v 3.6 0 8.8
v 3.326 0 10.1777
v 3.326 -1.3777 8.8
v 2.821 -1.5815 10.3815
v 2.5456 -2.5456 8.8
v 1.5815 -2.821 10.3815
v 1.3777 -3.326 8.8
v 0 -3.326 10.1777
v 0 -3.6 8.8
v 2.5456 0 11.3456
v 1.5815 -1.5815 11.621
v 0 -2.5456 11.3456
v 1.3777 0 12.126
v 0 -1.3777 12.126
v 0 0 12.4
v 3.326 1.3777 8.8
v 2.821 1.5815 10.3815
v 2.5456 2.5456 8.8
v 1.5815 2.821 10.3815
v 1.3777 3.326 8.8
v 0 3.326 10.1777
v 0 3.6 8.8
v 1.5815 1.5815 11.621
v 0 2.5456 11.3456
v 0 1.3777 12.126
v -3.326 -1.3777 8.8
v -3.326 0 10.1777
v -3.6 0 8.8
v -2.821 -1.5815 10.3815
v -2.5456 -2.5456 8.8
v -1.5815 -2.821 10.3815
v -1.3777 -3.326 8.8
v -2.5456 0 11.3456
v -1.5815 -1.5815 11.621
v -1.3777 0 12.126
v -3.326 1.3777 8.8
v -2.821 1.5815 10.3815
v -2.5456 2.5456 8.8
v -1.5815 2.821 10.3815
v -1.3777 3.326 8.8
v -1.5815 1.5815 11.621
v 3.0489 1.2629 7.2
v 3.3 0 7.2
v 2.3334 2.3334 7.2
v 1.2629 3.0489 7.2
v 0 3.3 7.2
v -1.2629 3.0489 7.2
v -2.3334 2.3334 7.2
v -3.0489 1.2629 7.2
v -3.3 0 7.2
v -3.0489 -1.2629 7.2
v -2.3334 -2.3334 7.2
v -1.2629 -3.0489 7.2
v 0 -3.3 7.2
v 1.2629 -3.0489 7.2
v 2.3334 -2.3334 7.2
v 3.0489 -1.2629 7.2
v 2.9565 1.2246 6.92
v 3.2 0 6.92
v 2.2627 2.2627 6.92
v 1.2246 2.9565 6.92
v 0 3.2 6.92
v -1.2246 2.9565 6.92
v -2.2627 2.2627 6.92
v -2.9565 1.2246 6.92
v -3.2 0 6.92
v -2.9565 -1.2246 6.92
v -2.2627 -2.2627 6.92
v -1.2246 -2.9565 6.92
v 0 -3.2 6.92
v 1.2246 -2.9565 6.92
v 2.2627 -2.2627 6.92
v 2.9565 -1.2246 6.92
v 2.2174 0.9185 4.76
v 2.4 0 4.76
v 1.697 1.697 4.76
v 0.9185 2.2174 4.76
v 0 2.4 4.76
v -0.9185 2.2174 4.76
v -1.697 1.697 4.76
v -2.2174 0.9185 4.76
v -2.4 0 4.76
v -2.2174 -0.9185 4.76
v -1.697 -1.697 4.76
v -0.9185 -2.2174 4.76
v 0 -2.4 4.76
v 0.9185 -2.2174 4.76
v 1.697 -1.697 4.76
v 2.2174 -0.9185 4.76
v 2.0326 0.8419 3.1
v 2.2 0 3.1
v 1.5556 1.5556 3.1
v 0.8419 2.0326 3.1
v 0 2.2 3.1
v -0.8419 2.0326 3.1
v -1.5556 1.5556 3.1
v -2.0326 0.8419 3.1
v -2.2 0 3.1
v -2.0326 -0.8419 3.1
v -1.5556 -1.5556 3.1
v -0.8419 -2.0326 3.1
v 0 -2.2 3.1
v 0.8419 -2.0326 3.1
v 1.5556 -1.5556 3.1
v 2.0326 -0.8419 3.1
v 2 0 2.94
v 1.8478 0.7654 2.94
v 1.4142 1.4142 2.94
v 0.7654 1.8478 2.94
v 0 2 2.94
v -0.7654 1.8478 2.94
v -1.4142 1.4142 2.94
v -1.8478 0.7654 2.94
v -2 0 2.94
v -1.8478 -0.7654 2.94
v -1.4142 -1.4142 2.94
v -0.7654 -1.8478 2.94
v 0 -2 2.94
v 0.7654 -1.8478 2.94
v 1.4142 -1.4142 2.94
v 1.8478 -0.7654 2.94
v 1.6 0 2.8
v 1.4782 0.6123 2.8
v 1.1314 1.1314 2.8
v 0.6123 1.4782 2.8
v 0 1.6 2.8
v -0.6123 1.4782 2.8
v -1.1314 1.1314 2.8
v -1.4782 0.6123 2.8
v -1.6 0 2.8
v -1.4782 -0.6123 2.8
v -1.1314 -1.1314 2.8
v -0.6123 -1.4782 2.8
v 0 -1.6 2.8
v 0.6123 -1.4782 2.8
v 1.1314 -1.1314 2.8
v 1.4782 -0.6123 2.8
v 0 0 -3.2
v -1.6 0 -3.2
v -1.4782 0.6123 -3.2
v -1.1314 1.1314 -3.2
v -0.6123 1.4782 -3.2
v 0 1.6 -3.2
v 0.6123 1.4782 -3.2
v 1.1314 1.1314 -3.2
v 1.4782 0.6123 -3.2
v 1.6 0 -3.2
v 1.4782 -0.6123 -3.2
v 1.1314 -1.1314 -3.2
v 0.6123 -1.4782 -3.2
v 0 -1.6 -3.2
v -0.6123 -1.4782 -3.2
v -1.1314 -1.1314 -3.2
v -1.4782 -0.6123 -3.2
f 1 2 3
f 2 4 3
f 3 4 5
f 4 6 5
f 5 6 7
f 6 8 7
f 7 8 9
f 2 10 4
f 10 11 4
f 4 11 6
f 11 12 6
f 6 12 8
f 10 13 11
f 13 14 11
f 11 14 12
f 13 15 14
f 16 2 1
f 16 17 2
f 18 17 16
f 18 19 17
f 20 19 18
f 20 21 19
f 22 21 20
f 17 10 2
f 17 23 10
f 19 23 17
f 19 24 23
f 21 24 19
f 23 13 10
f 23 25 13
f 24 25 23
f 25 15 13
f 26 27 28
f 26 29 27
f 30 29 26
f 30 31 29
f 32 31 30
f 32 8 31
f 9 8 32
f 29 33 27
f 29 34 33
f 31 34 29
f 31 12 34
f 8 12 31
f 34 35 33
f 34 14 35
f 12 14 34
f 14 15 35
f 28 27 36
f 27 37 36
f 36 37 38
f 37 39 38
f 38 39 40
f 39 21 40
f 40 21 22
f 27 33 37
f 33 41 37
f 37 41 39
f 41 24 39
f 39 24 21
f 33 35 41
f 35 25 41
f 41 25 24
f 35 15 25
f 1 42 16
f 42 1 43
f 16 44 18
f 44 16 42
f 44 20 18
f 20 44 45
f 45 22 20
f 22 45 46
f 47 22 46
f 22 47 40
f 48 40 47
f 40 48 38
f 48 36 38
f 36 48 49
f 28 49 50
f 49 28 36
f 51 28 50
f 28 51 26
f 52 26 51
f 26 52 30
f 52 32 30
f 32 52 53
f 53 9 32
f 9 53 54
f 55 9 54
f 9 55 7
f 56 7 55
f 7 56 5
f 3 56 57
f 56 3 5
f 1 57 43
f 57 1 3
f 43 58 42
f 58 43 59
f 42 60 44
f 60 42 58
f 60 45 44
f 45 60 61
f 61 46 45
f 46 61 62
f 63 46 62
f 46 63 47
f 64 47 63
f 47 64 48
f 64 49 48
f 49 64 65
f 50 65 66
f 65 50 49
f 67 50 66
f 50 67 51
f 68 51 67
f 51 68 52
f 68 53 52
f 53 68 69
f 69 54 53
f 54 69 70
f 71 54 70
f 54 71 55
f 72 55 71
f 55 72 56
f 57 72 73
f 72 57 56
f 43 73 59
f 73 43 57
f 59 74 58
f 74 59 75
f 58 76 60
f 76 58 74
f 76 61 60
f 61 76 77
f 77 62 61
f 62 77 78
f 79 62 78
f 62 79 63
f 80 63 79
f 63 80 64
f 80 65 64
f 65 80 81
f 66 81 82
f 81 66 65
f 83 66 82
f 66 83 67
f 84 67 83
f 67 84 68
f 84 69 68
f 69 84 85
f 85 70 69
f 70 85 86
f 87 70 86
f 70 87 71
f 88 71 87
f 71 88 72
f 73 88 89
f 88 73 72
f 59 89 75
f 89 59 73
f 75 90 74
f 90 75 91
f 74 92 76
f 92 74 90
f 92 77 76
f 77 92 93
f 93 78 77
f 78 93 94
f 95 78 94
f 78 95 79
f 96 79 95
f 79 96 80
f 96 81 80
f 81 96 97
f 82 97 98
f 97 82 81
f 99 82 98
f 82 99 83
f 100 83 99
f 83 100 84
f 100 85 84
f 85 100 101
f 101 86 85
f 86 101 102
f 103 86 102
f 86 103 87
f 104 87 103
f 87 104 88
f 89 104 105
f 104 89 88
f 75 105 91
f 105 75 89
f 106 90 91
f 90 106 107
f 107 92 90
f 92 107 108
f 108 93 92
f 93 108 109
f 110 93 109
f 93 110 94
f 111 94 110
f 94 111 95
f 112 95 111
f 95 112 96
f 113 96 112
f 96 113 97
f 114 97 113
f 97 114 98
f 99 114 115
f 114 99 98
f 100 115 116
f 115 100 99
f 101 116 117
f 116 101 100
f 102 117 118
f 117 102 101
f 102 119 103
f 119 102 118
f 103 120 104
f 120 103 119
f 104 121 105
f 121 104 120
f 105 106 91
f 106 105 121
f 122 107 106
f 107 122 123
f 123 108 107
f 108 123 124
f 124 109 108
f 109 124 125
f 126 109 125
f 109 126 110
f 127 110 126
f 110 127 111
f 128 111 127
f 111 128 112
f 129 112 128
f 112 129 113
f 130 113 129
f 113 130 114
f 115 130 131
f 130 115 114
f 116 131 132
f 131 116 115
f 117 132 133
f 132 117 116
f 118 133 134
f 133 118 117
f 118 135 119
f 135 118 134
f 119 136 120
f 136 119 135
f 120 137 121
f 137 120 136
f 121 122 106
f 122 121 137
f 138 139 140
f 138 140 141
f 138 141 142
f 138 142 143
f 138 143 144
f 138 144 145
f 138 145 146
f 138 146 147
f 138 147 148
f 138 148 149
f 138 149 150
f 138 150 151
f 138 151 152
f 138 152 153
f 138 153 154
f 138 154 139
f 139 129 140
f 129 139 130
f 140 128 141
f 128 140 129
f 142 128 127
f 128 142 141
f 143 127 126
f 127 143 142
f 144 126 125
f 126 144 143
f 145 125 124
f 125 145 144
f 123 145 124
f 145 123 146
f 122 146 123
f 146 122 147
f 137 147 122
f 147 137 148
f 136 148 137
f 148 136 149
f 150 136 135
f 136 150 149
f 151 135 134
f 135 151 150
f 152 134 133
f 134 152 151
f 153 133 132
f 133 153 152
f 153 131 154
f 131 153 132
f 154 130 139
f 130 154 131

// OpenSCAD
use <../lib.scad>
use <../p/4-4con10.scad>
use <../p/4-4con11.scad>
use <../p/4-4con3.scad>
use <../p/4-4con32.scad>
use <../p/4-4con4.scad>
use <../p/4-4cylc.scad>
use <../p/4-4edge.scad>
use <../p/4-8sphe.scad>
$fa=1; $fs=0.2;
function ldraw_lib__90508(realsolid=false) = [
// 0 Minifig Maracas
// 0 Name: 90508.dat
// 0 Author: Magnus Forsberg [MagFors]
// 0 !LDRAW_ORG Part UPDATE 2011-01
// 0 !LICENSE Licensed under CC BY 2.0 and CC BY 4.0 : see CAreadme.txt
// 
// 0 BFC CERTIFY CCW
  [0,"BFC","CERTIFY"],
  [0,"BFC","CCW"],
// 
// 0 !CATEGORY Minifig Accessory
// 
// 0 !HISTORY 2011-07-25 [PTadmin] Official Update 2011-01
// 
// 
// 1 16 0 -22 0 9 0 0 0 -9 0 0 0 -9 4-8sphe.dat
  [1,16,0,-22,0,9,0,0,0,-9,0,0,0,-9, ldraw_lib__4_8sphe(realsolid)],
// 1 16 0 -22 0 0.75 0 0 0 4 0 0 0 0.75 4-4con11.dat
  [1,16,0,-22,0,0.75,0,0,0,4,0,0,0,0.75, ldraw_lib__4_4con11(realsolid)],
// 1 16 0 -18 0 0.25 0 0 0 0.7 0 0 0 0.25 4-4con32.dat
  [1,16,0,-18,0,0.25,0,0,0,0.7,0,0,0,0.25, ldraw_lib__4_4con32(realsolid)],
// 1 16 0 -17.3 0 2 0 0 0 5.4 0 0 0 2 4-4con3.dat
  [1,16,0,-17.3,0,2,0,0,0,5.4,0,0,0,2, ldraw_lib__4_4con3(realsolid)],
// 1 16 0 -11.9 0 0.5 0 0 0 4.15 0 0 0 0.5 4-4con11.dat
  [1,16,0,-11.9,0,0.5,0,0,0,4.15,0,0,0,0.5, ldraw_lib__4_4con11(realsolid)],
// 1 16 0 -7.75 0 5.5 0 0 0 1 0 0 0 5.5 4-4edge.dat
  [1,16,0,-7.75,0,5.5,0,0,0,1,0,0,0,5.5, ldraw_lib__4_4edge(realsolid)],
// 1 16 0 -7.75 0 0.5 0 0 0 0.4 0 0 0 0.5 4-4con10.dat
  [1,16,0,-7.75,0,0.5,0,0,0,0.4,0,0,0,0.5, ldraw_lib__4_4con10(realsolid)],
// 1 16 0 -7.35 0 1 0 0 0 0.35 0 0 0 1 4-4con4.dat
  [1,16,0,-7.35,0,1,0,0,0,0.35,0,0,0,1, ldraw_lib__4_4con4(realsolid)],
// 1 16 0 8 0 -4 0 0 0 -15 0 0 0 4 4-4cylc.dat
  [1,16,0,8,0,-4,0,0,0,-15,0,0,0,4, ldraw_lib__4_4cylc(realsolid)],
// 0 // Added lines/Condlines
// 5 24 9 -22 0 8.3151 -22 3.4443 8.25 -18 0 8.3151 -25.4443 0
  [5,24,9,-22,0,8.3151,-22,3.4443,8.25,-18,0,8.3151,-25.4443,0],
// 5 24 7.62218 -18 3.15727 8.25 -18 0 9 -22 0 8 -17.3 0
  [5,24,7.62218,-18,3.15727,8.25,-18,0,9,-22,0,8,-17.3,0],
// 5 24 8.3151 -22 3.4443 6.3639 -22 6.3639 7.62218 -18 3.15727 5.8797 -25.4443 5.8797
  [5,24,8.3151,-22,3.4443,6.3639,-22,6.3639,7.62218,-18,3.15727,5.8797,-25.4443,5.8797],
// 5 24 5.83357 -18 5.83357 7.62218 -18 3.15727 8.3151 -22 3.4443 7.3912 -17.3 3.0616
  [5,24,5.83357,-18,5.83357,7.62218,-18,3.15727,8.3151,-22,3.4443,7.3912,-17.3,3.0616],
// 5 24 6.3639 -22 6.3639 3.4443 -22 8.3151 5.83357 -18 5.83357 3.4443 -25.4443 7.5681
  [5,24,6.3639,-22,6.3639,3.4443,-22,8.3151,5.83357,-18,5.83357,3.4443,-25.4443,7.5681],
// 5 24 3.15727 -18 7.62218 5.83357 -18 5.83357 6.3639 -22 6.3639 5.6568 -17.3 5.6568
  [5,24,3.15727,-18,7.62218,5.83357,-18,5.83357,6.3639,-22,6.3639,5.6568,-17.3,5.6568],
// 5 24 3.4443 -22 8.3151 0 -22 9 3.15727 -18 7.62218 3.4443 -25.4443 7.5681
  [5,24,3.4443,-22,8.3151,0,-22,9,3.15727,-18,7.62218,3.4443,-25.4443,7.5681],
// 5 24 0 -18 8.25 3.15727 -18 7.62218 3.4443 -22 8.3151 3.0616 -17.3 7.3912
  [5,24,0,-18,8.25,3.15727,-18,7.62218,3.4443,-22,8.3151,3.0616,-17.3,7.3912],
// 5 24 0 -22 9 -3.4443 -22 8.3151 0 -18 8.25 0 -25.4443 8.3151
  [5,24,0,-22,9,-3.4443,-22,8.3151,0,-18,8.25,0,-25.4443,8.3151],
// 5 24 -3.15727 -18 7.62218 0 -18 8.25 0 -22 9 0 -17.3 8
  [5,24,-3.15727,-18,7.62218,0,-18,8.25,0,-22,9,0,-17.3,8],
// 5 24 -3.4443 -22 8.3151 -6.3639 -22 6.3639 -3.15727 -18 7.62218 -3.4443 -25.4443 7.5681
  [5,24,-3.4443,-22,8.3151,-6.3639,-22,6.3639,-3.15727,-18,7.62218,-3.4443,-25.4443,7.5681],
// 5 24 -5.83357 -18 5.83357 -3.15727 -18 7.62218 -3.4443 -22 8.3151 -3.0616 -17.3 7.3912
  [5,24,-5.83357,-18,5.83357,-3.15727,-18,7.62218,-3.4443,-22,8.3151,-3.0616,-17.3,7.3912],
// 5 24 -6.3639 -22 6.3639 -8.3151 -22 3.4443 -5.83357 -18 5.83357 -5.8797 -25.4443 5.8797
  [5,24,-6.3639,-22,6.3639,-8.3151,-22,3.4443,-5.83357,-18,5.83357,-5.8797,-25.4443,5.8797],
// 5 24 -7.62218 -18 3.15727 -5.83357 -18 5.83357 -6.3639 -22 6.3639 -5.6568 -17.3 5.6568
  [5,24,-7.62218,-18,3.15727,-5.83357,-18,5.83357,-6.3639,-22,6.3639,-5.6568,-17.3,5.6568],
// 5 24 -8.3151 -22 3.4443 -9 -22 0 -7.62218 -18 3.15727 -8.3151 -25.4443 0
  [5,24,-8.3151,-22,3.4443,-9,-22,0,-7.62218,-18,3.15727,-8.3151,-25.4443,0],
// 5 24 -8.25 -18 0 -7.62218 -18 3.15727 -8.3151 -22 3.4443 -7.3912 -17.3 3.0616
  [5,24,-8.25,-18,0,-7.62218,-18,3.15727,-8.3151,-22,3.4443,-7.3912,-17.3,3.0616],
// 5 24 -9 -22 0 -8.3151 -22 -3.4443 -8.25 -18 0 -8.3151 -25.4443 0
  [5,24,-9,-22,0,-8.3151,-22,-3.4443,-8.25,-18,0,-8.3151,-25.4443,0],
// 5 24 -7.62218 -18 -3.15727 -8.25 -18 0 -9 -22 0 -8 -17.3 0
  [5,24,-7.62218,-18,-3.15727,-8.25,-18,0,-9,-22,0,-8,-17.3,0],
// 5 24 -8.3151 -22 -3.4443 -6.3639 -22 -6.3639 -7.62218 -18 -3.15727 -5.8797 -25.4443 -5.8797
  [5,24,-8.3151,-22,-3.4443,-6.3639,-22,-6.3639,-7.62218,-18,-3.15727,-5.8797,-25.4443,-5.8797],
// 5 24 -5.83357 -18 -5.83357 -7.62218 -18 -3.15727 -8.3151 -22 -3.4443 -7.3912 -17.3 -3.0616
  [5,24,-5.83357,-18,-5.83357,-7.62218,-18,-3.15727,-8.3151,-22,-3.4443,-7.3912,-17.3,-3.0616],
// 5 24 -6.3639 -22 -6.3639 -3.4443 -22 -8.3151 -5.83357 -18 -5.83357 -3.4443 -25.4443 -7.5681
  [5,24,-6.3639,-22,-6.3639,-3.4443,-22,-8.3151,-5.83357,-18,-5.83357,-3.4443,-25.4443,-7.5681],
// 5 24 -3.15727 -18 -7.62218 -5.83357 -18 -5.83357 -6.3639 -22 -6.3639 -5.6568 -17.3 -5.6568
  [5,24,-3.15727,-18,-7.62218,-5.83357,-18,-5.83357,-6.3639,-22,-6.3639,-5.6568,-17.3,-5.6568],
// 5 24 -3.4443 -22 -8.3151 0 -22 -9 -3.15727 -18 -7.62218 -3.4443 -25.4443 -7.5681
  [5,24,-3.4443,-22,-8.3151,0,-22,-9,-3.15727,-18,-7.62218,-3.4443,-25.4443,-7.5681],
// 5 24 0 -18 -8.25 -3.15727 -18 -7.62218 -3.4443 -22 -8.3151 -3.0616 -17.3 -7.3912
  [5,24,0,-18,-8.25,-3.15727,-18,-7.62218,-3.4443,-22,-8.3151,-3.0616,-17.3,-7.3912],
// 5 24 0 -22 -9 3.4443 -22 -8.3151 0 -18 -8.25 0 -25.4443 -8.3151
  [5,24,0,-22,-9,3.4443,-22,-8.3151,0,-18,-8.25,0,-25.4443,-8.3151],
// 5 24 3.15727 -18 -7.62218 0 -18 -8.25 0 -22 -9 0 -17.3 -8
  [5,24,3.15727,-18,-7.62218,0,-18,-8.25,0,-22,-9,0,-17.3,-8],
// 5 24 3.4443 -22 -8.3151 6.3639 -22 -6.3639 3.15727 -18 -7.62218 3.4443 -25.4443 -7.5681
  [5,24,3.4443,-22,-8.3151,6.3639,-22,-6.3639,3.15727,-18,-7.62218,3.4443,-25.4443,-7.5681],
// 5 24 5.83357 -18 -5.83357 3.15727 -18 -7.62218 3.4443 -22 -8.3151 3.0616 -17.3 -7.3912
  [5,24,5.83357,-18,-5.83357,3.15727,-18,-7.62218,3.4443,-22,-8.3151,3.0616,-17.3,-7.3912],
// 5 24 6.3639 -22 -6.3639 8.3151 -22 -3.4443 5.83357 -18 -5.83357 5.8797 -25.4443 -5.8797
  [5,24,6.3639,-22,-6.3639,8.3151,-22,-3.4443,5.83357,-18,-5.83357,5.8797,-25.4443,-5.8797],
// 5 24 7.62218 -18 -3.15727 5.83357 -18 -5.83357 6.3639 -22 -6.3639 5.6568 -17.3 -5.6568
  [5,24,7.62218,-18,-3.15727,5.83357,-18,-5.83357,6.3639,-22,-6.3639,5.6568,-17.3,-5.6568],
// 5 24 8.3151 -22 -3.4443 9 -22 0 7.62218 -18 -3.15727 8.3151 -25.4443 0
  [5,24,8.3151,-22,-3.4443,9,-22,0,7.62218,-18,-3.15727,8.3151,-25.4443,0],
// 5 24 8.25 -18 0 7.62218 -18 -3.15727 8.3151 -22 -3.4443 7.3912 -17.3 -3.0616
  [5,24,8.25,-18,0,7.62218,-18,-3.15727,8.3151,-22,-3.4443,7.3912,-17.3,-3.0616],
// 
// 5 24 8 -17.3 0 7.3912 -17.3 3.0616 7.62218 -18 3.15727 6 -11.9 0
  [5,24,8,-17.3,0,7.3912,-17.3,3.0616,7.62218,-18,3.15727,6,-11.9,0],
// 5 24 7.3912 -17.3 3.0616 5.6568 -17.3 5.6568 5.83357 -18 5.83357 5.5434 -11.9 2.2962
  [5,24,7.3912,-17.3,3.0616,5.6568,-17.3,5.6568,5.83357,-18,5.83357,5.5434,-11.9,2.2962],
// 5 24 5.6568 -17.3 5.6568 3.0616 -17.3 7.3912 3.15727 -18 7.62218 4.2426 -11.9 4.2426
  [5,24,5.6568,-17.3,5.6568,3.0616,-17.3,7.3912,3.15727,-18,7.62218,4.2426,-11.9,4.2426],
// 5 24 3.0616 -17.3 7.3912 0 -17.3 8 0 -18 8.25 2.2962 -11.9 5.5434
  [5,24,3.0616,-17.3,7.3912,0,-17.3,8,0,-18,8.25,2.2962,-11.9,5.5434],
// 5 24 0 -17.3 8 -3.0616 -17.3 7.3912 -3.15727 -18 7.62218 0 -11.9 6
  [5,24,0,-17.3,8,-3.0616,-17.3,7.3912,-3.15727,-18,7.62218,0,-11.9,6],
// 5 24 -3.0616 -17.3 7.3912 -5.6568 -17.3 5.6568 -5.83357 -18 5.83357 -2.2962 -11.9 5.5434
  [5,24,-3.0616,-17.3,7.3912,-5.6568,-17.3,5.6568,-5.83357,-18,5.83357,-2.2962,-11.9,5.5434],
// 5 24 -5.6568 -17.3 5.6568 -7.3912 -17.3 3.0616 -7.62218 -18 3.15727 -4.2426 -11.9 4.2426
  [5,24,-5.6568,-17.3,5.6568,-7.3912,-17.3,3.0616,-7.62218,-18,3.15727,-4.2426,-11.9,4.2426],
// 5 24 -7.3912 -17.3 3.0616 -8 -17.3 0 -8.25 -18 0 -5.5434 -11.9 2.2962
  [5,24,-7.3912,-17.3,3.0616,-8,-17.3,0,-8.25,-18,0,-5.5434,-11.9,2.2962],
// 5 24 -8 -17.3 0 -7.3912 -17.3 -3.0616 -7.62218 -18 -3.15727 -6 -11.9 0
  [5,24,-8,-17.3,0,-7.3912,-17.3,-3.0616,-7.62218,-18,-3.15727,-6,-11.9,0],
// 5 24 -7.3912 -17.3 -3.0616 -5.6568 -17.3 -5.6568 -5.83357 -18 -5.83357 -5.5434 -11.9 -2.2962
  [5,24,-7.3912,-17.3,-3.0616,-5.6568,-17.3,-5.6568,-5.83357,-18,-5.83357,-5.5434,-11.9,-2.2962],
// 5 24 -5.6568 -17.3 -5.6568 -3.0616 -17.3 -7.3912 -3.15727 -18 -7.62218 -4.2426 -11.9 -4.2426
  [5,24,-5.6568,-17.3,-5.6568,-3.0616,-17.3,-7.3912,-3.15727,-18,-7.62218,-4.2426,-11.9,-4.2426],
// 5 24 -3.0616 -17.3 -7.3912 0 -17.3 -8 0 -18 -8.25 -2.2962 -11.9 -5.5434
  [5,24,-3.0616,-17.3,-7.3912,0,-17.3,-8,0,-18,-8.25,-2.2962,-11.9,-5.5434],
// 5 24 0 -17.3 -8 3.0616 -17.3 -7.3912 3.15727 -18 -7.62218 0 -11.9 -6
  [5,24,0,-17.3,-8,3.0616,-17.3,-7.3912,3.15727,-18,-7.62218,0,-11.9,-6],
// 5 24 3.0616 -17.3 -7.3912 5.6568 -17.3 -5.6568 5.83357 -18 -5.83357 2.2962 -11.9 -5.5434
  [5,24,3.0616,-17.3,-7.3912,5.6568,-17.3,-5.6568,5.83357,-18,-5.83357,2.2962,-11.9,-5.5434],
// 5 24 5.6568 -17.3 -5.6568 7.3912 -17.3 -3.0616 7.62218 -18 -3.15727 4.2426 -11.9 -4.2426
  [5,24,5.6568,-17.3,-5.6568,7.3912,-17.3,-3.0616,7.62218,-18,-3.15727,4.2426,-11.9,-4.2426],
// 5 24 7.3912 -17.3 -3.0616 8 -17.3 0 8.25 -18 0 5.5434 -11.9 -2.2962
  [5,24,7.3912,-17.3,-3.0616,8,-17.3,0,8.25,-18,0,5.5434,-11.9,-2.2962],
// 
// 5 24 6 -11.9 0 5.5434 -11.9 2.2962 7.3912 -17.3 3.0616 5.5 -7.75 0
  [5,24,6,-11.9,0,5.5434,-11.9,2.2962,7.3912,-17.3,3.0616,5.5,-7.75,0],
// 5 24 5.5434 -11.9 2.2962 4.2426 -11.9 4.2426 5.6568 -17.3 5.6568 5.08145 -7.75 2.10485
  [5,24,5.5434,-11.9,2.2962,4.2426,-11.9,4.2426,5.6568,-17.3,5.6568,5.08145,-7.75,2.10485],
// 5 24 4.2426 -11.9 4.2426 2.2962 -11.9 5.5434 3.0616 -17.3 7.3912 3.88905 -7.75 3.88905
  [5,24,4.2426,-11.9,4.2426,2.2962,-11.9,5.5434,3.0616,-17.3,7.3912,3.88905,-7.75,3.88905],
// 5 24 2.2962 -11.9 5.5434 0 -11.9 6 0 -17.3 8 2.10485 -7.75 5.08145
  [5,24,2.2962,-11.9,5.5434,0,-11.9,6,0,-17.3,8,2.10485,-7.75,5.08145],
// 5 24 0 -11.9 6 -2.2962 -11.9 5.5434 -3.0616 -17.3 7.3912 0 -7.75 5.5
  [5,24,0,-11.9,6,-2.2962,-11.9,5.5434,-3.0616,-17.3,7.3912,0,-7.75,5.5],
// 5 24 -2.2962 -11.9 5.5434 -4.2426 -11.9 4.2426 -5.6568 -17.3 5.6568 -2.10485 -7.75 5.08145
  [5,24,-2.2962,-11.9,5.5434,-4.2426,-11.9,4.2426,-5.6568,-17.3,5.6568,-2.10485,-7.75,5.08145],
// 5 24 -4.2426 -11.9 4.2426 -5.5434 -11.9 2.2962 -7.3912 -17.3 3.0616 -3.88905 -7.75 3.88905
  [5,24,-4.2426,-11.9,4.2426,-5.5434,-11.9,2.2962,-7.3912,-17.3,3.0616,-3.88905,-7.75,3.88905],
// 5 24 -5.5434 -11.9 2.2962 -6 -11.9 0 -8 -17.3 0 -5.08145 -7.75 2.10485
  [5,24,-5.5434,-11.9,2.2962,-6,-11.9,0,-8,-17.3,0,-5.08145,-7.75,2.10485],
// 5 24 -6 -11.9 0 -5.5434 -11.9 -2.2962 -7.3912 -17.3 -3.0616 -5.5 -7.75 0
  [5,24,-6,-11.9,0,-5.5434,-11.9,-2.2962,-7.3912,-17.3,-3.0616,-5.5,-7.75,0],
// 5 24 -5.5434 -11.9 -2.2962 -4.2426 -11.9 -4.2426 -5.6568 -17.3 -5.6568 -5.08145 -7.75 -2.10485
  [5,24,-5.5434,-11.9,-2.2962,-4.2426,-11.9,-4.2426,-5.6568,-17.3,-5.6568,-5.08145,-7.75,-2.10485],
// 5 24 -4.2426 -11.9 -4.2426 -2.2962 -11.9 -5.5434 -3.0616 -17.3 -7.3912 -3.88905 -7.75 -3.88905
  [5,24,-4.2426,-11.9,-4.2426,-2.2962,-11.9,-5.5434,-3.0616,-17.3,-7.3912,-3.88905,-7.75,-3.88905],
// 5 24 -2.2962 -11.9 -5.5434 0 -11.9 -6 0 -17.3 -8 -2.10485 -7.75 -5.08145
  [5,24,-2.2962,-11.9,-5.5434,0,-11.9,-6,0,-17.3,-8,-2.10485,-7.75,-5.08145],
// 5 24 0 -11.9 -6 2.2962 -11.9 -5.5434 3.0616 -17.3 -7.3912 0 -7.75 -5.5
  [5,24,0,-11.9,-6,2.2962,-11.9,-5.5434,3.0616,-17.3,-7.3912,0,-7.75,-5.5],
// 5 24 2.2962 -11.9 -5.5434 4.2426 -11.9 -4.2426 5.6568 -17.3 -5.6568 2.10485 -7.75 -5.08145
  [5,24,2.2962,-11.9,-5.5434,4.2426,-11.9,-4.2426,5.6568,-17.3,-5.6568,2.10485,-7.75,-5.08145],
// 5 24 4.2426 -11.9 -4.2426 5.5434 -11.9 -2.2962 7.3912 -17.3 -3.0616 3.88905 -7.75 -3.88905
  [5,24,4.2426,-11.9,-4.2426,5.5434,-11.9,-2.2962,7.3912,-17.3,-3.0616,3.88905,-7.75,-3.88905],
// 5 24 5.5434 -11.9 -2.2962 6 -11.9 0 8 -17.3 0 5.08145 -7.75 -2.10485
  [5,24,5.5434,-11.9,-2.2962,6,-11.9,0,8,-17.3,0,5.08145,-7.75,-2.10485],
// 
// 5 24 5 -7.35 0 4.6195 -7.35 1.9135 5.08145 -7.75 2.10485 4 -7 0
  [5,24,5,-7.35,0,4.6195,-7.35,1.9135,5.08145,-7.75,2.10485,4,-7,0],
// 5 24 4.6195 -7.35 1.9135 3.5355 -7.35 3.5355 3.88905 -7.75 3.88905 3.6956 -7 1.5308
  [5,24,4.6195,-7.35,1.9135,3.5355,-7.35,3.5355,3.88905,-7.75,3.88905,3.6956,-7,1.5308],
// 5 24 3.5355 -7.35 3.5355 1.9135 -7.35 4.6195 2.10485 -7.75 5.08145 2.8284 -7 2.8284
  [5,24,3.5355,-7.35,3.5355,1.9135,-7.35,4.6195,2.10485,-7.75,5.08145,2.8284,-7,2.8284],
// 5 24 1.9135 -7.35 4.6195 0 -7.35 5 0 -7.75 5.5 1.5308 -7 3.6956
  [5,24,1.9135,-7.35,4.6195,0,-7.35,5,0,-7.75,5.5,1.5308,-7,3.6956],
// 5 24 0 -7.35 5 -1.9135 -7.35 4.6195 -2.10485 -7.75 5.08145 0 -7 4
  [5,24,0,-7.35,5,-1.9135,-7.35,4.6195,-2.10485,-7.75,5.08145,0,-7,4],
// 5 24 -1.9135 -7.35 4.6195 -3.5355 -7.35 3.5355 -3.88905 -7.75 3.88905 -1.5308 -7 3.6956
  [5,24,-1.9135,-7.35,4.6195,-3.5355,-7.35,3.5355,-3.88905,-7.75,3.88905,-1.5308,-7,3.6956],
// 5 24 -3.5355 -7.35 3.5355 -4.6195 -7.35 1.9135 -5.08145 -7.75 2.10485 -2.8284 -7 2.8284
  [5,24,-3.5355,-7.35,3.5355,-4.6195,-7.35,1.9135,-5.08145,-7.75,2.10485,-2.8284,-7,2.8284],
// 5 24 -4.6195 -7.35 1.9135 -5 -7.35 0 -5.5 -7.75 0 -3.6956 -7 1.5308
  [5,24,-4.6195,-7.35,1.9135,-5,-7.35,0,-5.5,-7.75,0,-3.6956,-7,1.5308],
// 5 24 -5 -7.35 0 -4.6195 -7.35 -1.9135 -5.08145 -7.75 -2.10485 -4 -7 0
  [5,24,-5,-7.35,0,-4.6195,-7.35,-1.9135,-5.08145,-7.75,-2.10485,-4,-7,0],
// 5 24 -4.6195 -7.35 -1.9135 -3.5355 -7.35 -3.5355 -3.88905 -7.75 -3.88905 -3.6956 -7 -1.5308
  [5,24,-4.6195,-7.35,-1.9135,-3.5355,-7.35,-3.5355,-3.88905,-7.75,-3.88905,-3.6956,-7,-1.5308],
// 5 24 -3.5355 -7.35 -3.5355 -1.9135 -7.35 -4.6195 -2.10485 -7.75 -5.08145 -2.8284 -7 -2.8284
  [5,24,-3.5355,-7.35,-3.5355,-1.9135,-7.35,-4.6195,-2.10485,-7.75,-5.08145,-2.8284,-7,-2.8284],
// 5 24 -1.9135 -7.35 -4.6195 0 -7.35 -5 0 -7.75 -5.5 -1.5308 -7 -3.6956
  [5,24,-1.9135,-7.35,-4.6195,0,-7.35,-5,0,-7.75,-5.5,-1.5308,-7,-3.6956],
// 5 24 0 -7.35 -5 1.9135 -7.35 -4.6195 2.10485 -7.75 -5.08145 0 -7 -4
  [5,24,0,-7.35,-5,1.9135,-7.35,-4.6195,2.10485,-7.75,-5.08145,0,-7,-4],
// 5 24 1.9135 -7.35 -4.6195 3.5355 -7.35 -3.5355 3.88905 -7.75 -3.88905 1.5308 -7 -3.6956
  [5,24,1.9135,-7.35,-4.6195,3.5355,-7.35,-3.5355,3.88905,-7.75,-3.88905,1.5308,-7,-3.6956],
// 5 24 3.5355 -7.35 -3.5355 4.6195 -7.35 -1.9135 5.08145 -7.75 -2.10485 2.8284 -7 -2.8284
  [5,24,3.5355,-7.35,-3.5355,4.6195,-7.35,-1.9135,5.08145,-7.75,-2.10485,2.8284,-7,-2.8284],
// 5 24 4.6195 -7.35 -1.9135 5 -7.35 0 5.5 -7.75 0 3.6956 -7 -1.5308
  [5,24,4.6195,-7.35,-1.9135,5,-7.35,0,5.5,-7.75,0,3.6956,-7,-1.5308],
];
module ldraw_lib__90508(step=0, col=false, unit=2/5, alt=false, line=0.2, solid=!$preview)
    makepoly(ldraw_lib__90508(solid), step=step, col=col, unit=unit, alt=alt, line=line, solid=solid);
ldraw_lib__90508(line=0.2);
